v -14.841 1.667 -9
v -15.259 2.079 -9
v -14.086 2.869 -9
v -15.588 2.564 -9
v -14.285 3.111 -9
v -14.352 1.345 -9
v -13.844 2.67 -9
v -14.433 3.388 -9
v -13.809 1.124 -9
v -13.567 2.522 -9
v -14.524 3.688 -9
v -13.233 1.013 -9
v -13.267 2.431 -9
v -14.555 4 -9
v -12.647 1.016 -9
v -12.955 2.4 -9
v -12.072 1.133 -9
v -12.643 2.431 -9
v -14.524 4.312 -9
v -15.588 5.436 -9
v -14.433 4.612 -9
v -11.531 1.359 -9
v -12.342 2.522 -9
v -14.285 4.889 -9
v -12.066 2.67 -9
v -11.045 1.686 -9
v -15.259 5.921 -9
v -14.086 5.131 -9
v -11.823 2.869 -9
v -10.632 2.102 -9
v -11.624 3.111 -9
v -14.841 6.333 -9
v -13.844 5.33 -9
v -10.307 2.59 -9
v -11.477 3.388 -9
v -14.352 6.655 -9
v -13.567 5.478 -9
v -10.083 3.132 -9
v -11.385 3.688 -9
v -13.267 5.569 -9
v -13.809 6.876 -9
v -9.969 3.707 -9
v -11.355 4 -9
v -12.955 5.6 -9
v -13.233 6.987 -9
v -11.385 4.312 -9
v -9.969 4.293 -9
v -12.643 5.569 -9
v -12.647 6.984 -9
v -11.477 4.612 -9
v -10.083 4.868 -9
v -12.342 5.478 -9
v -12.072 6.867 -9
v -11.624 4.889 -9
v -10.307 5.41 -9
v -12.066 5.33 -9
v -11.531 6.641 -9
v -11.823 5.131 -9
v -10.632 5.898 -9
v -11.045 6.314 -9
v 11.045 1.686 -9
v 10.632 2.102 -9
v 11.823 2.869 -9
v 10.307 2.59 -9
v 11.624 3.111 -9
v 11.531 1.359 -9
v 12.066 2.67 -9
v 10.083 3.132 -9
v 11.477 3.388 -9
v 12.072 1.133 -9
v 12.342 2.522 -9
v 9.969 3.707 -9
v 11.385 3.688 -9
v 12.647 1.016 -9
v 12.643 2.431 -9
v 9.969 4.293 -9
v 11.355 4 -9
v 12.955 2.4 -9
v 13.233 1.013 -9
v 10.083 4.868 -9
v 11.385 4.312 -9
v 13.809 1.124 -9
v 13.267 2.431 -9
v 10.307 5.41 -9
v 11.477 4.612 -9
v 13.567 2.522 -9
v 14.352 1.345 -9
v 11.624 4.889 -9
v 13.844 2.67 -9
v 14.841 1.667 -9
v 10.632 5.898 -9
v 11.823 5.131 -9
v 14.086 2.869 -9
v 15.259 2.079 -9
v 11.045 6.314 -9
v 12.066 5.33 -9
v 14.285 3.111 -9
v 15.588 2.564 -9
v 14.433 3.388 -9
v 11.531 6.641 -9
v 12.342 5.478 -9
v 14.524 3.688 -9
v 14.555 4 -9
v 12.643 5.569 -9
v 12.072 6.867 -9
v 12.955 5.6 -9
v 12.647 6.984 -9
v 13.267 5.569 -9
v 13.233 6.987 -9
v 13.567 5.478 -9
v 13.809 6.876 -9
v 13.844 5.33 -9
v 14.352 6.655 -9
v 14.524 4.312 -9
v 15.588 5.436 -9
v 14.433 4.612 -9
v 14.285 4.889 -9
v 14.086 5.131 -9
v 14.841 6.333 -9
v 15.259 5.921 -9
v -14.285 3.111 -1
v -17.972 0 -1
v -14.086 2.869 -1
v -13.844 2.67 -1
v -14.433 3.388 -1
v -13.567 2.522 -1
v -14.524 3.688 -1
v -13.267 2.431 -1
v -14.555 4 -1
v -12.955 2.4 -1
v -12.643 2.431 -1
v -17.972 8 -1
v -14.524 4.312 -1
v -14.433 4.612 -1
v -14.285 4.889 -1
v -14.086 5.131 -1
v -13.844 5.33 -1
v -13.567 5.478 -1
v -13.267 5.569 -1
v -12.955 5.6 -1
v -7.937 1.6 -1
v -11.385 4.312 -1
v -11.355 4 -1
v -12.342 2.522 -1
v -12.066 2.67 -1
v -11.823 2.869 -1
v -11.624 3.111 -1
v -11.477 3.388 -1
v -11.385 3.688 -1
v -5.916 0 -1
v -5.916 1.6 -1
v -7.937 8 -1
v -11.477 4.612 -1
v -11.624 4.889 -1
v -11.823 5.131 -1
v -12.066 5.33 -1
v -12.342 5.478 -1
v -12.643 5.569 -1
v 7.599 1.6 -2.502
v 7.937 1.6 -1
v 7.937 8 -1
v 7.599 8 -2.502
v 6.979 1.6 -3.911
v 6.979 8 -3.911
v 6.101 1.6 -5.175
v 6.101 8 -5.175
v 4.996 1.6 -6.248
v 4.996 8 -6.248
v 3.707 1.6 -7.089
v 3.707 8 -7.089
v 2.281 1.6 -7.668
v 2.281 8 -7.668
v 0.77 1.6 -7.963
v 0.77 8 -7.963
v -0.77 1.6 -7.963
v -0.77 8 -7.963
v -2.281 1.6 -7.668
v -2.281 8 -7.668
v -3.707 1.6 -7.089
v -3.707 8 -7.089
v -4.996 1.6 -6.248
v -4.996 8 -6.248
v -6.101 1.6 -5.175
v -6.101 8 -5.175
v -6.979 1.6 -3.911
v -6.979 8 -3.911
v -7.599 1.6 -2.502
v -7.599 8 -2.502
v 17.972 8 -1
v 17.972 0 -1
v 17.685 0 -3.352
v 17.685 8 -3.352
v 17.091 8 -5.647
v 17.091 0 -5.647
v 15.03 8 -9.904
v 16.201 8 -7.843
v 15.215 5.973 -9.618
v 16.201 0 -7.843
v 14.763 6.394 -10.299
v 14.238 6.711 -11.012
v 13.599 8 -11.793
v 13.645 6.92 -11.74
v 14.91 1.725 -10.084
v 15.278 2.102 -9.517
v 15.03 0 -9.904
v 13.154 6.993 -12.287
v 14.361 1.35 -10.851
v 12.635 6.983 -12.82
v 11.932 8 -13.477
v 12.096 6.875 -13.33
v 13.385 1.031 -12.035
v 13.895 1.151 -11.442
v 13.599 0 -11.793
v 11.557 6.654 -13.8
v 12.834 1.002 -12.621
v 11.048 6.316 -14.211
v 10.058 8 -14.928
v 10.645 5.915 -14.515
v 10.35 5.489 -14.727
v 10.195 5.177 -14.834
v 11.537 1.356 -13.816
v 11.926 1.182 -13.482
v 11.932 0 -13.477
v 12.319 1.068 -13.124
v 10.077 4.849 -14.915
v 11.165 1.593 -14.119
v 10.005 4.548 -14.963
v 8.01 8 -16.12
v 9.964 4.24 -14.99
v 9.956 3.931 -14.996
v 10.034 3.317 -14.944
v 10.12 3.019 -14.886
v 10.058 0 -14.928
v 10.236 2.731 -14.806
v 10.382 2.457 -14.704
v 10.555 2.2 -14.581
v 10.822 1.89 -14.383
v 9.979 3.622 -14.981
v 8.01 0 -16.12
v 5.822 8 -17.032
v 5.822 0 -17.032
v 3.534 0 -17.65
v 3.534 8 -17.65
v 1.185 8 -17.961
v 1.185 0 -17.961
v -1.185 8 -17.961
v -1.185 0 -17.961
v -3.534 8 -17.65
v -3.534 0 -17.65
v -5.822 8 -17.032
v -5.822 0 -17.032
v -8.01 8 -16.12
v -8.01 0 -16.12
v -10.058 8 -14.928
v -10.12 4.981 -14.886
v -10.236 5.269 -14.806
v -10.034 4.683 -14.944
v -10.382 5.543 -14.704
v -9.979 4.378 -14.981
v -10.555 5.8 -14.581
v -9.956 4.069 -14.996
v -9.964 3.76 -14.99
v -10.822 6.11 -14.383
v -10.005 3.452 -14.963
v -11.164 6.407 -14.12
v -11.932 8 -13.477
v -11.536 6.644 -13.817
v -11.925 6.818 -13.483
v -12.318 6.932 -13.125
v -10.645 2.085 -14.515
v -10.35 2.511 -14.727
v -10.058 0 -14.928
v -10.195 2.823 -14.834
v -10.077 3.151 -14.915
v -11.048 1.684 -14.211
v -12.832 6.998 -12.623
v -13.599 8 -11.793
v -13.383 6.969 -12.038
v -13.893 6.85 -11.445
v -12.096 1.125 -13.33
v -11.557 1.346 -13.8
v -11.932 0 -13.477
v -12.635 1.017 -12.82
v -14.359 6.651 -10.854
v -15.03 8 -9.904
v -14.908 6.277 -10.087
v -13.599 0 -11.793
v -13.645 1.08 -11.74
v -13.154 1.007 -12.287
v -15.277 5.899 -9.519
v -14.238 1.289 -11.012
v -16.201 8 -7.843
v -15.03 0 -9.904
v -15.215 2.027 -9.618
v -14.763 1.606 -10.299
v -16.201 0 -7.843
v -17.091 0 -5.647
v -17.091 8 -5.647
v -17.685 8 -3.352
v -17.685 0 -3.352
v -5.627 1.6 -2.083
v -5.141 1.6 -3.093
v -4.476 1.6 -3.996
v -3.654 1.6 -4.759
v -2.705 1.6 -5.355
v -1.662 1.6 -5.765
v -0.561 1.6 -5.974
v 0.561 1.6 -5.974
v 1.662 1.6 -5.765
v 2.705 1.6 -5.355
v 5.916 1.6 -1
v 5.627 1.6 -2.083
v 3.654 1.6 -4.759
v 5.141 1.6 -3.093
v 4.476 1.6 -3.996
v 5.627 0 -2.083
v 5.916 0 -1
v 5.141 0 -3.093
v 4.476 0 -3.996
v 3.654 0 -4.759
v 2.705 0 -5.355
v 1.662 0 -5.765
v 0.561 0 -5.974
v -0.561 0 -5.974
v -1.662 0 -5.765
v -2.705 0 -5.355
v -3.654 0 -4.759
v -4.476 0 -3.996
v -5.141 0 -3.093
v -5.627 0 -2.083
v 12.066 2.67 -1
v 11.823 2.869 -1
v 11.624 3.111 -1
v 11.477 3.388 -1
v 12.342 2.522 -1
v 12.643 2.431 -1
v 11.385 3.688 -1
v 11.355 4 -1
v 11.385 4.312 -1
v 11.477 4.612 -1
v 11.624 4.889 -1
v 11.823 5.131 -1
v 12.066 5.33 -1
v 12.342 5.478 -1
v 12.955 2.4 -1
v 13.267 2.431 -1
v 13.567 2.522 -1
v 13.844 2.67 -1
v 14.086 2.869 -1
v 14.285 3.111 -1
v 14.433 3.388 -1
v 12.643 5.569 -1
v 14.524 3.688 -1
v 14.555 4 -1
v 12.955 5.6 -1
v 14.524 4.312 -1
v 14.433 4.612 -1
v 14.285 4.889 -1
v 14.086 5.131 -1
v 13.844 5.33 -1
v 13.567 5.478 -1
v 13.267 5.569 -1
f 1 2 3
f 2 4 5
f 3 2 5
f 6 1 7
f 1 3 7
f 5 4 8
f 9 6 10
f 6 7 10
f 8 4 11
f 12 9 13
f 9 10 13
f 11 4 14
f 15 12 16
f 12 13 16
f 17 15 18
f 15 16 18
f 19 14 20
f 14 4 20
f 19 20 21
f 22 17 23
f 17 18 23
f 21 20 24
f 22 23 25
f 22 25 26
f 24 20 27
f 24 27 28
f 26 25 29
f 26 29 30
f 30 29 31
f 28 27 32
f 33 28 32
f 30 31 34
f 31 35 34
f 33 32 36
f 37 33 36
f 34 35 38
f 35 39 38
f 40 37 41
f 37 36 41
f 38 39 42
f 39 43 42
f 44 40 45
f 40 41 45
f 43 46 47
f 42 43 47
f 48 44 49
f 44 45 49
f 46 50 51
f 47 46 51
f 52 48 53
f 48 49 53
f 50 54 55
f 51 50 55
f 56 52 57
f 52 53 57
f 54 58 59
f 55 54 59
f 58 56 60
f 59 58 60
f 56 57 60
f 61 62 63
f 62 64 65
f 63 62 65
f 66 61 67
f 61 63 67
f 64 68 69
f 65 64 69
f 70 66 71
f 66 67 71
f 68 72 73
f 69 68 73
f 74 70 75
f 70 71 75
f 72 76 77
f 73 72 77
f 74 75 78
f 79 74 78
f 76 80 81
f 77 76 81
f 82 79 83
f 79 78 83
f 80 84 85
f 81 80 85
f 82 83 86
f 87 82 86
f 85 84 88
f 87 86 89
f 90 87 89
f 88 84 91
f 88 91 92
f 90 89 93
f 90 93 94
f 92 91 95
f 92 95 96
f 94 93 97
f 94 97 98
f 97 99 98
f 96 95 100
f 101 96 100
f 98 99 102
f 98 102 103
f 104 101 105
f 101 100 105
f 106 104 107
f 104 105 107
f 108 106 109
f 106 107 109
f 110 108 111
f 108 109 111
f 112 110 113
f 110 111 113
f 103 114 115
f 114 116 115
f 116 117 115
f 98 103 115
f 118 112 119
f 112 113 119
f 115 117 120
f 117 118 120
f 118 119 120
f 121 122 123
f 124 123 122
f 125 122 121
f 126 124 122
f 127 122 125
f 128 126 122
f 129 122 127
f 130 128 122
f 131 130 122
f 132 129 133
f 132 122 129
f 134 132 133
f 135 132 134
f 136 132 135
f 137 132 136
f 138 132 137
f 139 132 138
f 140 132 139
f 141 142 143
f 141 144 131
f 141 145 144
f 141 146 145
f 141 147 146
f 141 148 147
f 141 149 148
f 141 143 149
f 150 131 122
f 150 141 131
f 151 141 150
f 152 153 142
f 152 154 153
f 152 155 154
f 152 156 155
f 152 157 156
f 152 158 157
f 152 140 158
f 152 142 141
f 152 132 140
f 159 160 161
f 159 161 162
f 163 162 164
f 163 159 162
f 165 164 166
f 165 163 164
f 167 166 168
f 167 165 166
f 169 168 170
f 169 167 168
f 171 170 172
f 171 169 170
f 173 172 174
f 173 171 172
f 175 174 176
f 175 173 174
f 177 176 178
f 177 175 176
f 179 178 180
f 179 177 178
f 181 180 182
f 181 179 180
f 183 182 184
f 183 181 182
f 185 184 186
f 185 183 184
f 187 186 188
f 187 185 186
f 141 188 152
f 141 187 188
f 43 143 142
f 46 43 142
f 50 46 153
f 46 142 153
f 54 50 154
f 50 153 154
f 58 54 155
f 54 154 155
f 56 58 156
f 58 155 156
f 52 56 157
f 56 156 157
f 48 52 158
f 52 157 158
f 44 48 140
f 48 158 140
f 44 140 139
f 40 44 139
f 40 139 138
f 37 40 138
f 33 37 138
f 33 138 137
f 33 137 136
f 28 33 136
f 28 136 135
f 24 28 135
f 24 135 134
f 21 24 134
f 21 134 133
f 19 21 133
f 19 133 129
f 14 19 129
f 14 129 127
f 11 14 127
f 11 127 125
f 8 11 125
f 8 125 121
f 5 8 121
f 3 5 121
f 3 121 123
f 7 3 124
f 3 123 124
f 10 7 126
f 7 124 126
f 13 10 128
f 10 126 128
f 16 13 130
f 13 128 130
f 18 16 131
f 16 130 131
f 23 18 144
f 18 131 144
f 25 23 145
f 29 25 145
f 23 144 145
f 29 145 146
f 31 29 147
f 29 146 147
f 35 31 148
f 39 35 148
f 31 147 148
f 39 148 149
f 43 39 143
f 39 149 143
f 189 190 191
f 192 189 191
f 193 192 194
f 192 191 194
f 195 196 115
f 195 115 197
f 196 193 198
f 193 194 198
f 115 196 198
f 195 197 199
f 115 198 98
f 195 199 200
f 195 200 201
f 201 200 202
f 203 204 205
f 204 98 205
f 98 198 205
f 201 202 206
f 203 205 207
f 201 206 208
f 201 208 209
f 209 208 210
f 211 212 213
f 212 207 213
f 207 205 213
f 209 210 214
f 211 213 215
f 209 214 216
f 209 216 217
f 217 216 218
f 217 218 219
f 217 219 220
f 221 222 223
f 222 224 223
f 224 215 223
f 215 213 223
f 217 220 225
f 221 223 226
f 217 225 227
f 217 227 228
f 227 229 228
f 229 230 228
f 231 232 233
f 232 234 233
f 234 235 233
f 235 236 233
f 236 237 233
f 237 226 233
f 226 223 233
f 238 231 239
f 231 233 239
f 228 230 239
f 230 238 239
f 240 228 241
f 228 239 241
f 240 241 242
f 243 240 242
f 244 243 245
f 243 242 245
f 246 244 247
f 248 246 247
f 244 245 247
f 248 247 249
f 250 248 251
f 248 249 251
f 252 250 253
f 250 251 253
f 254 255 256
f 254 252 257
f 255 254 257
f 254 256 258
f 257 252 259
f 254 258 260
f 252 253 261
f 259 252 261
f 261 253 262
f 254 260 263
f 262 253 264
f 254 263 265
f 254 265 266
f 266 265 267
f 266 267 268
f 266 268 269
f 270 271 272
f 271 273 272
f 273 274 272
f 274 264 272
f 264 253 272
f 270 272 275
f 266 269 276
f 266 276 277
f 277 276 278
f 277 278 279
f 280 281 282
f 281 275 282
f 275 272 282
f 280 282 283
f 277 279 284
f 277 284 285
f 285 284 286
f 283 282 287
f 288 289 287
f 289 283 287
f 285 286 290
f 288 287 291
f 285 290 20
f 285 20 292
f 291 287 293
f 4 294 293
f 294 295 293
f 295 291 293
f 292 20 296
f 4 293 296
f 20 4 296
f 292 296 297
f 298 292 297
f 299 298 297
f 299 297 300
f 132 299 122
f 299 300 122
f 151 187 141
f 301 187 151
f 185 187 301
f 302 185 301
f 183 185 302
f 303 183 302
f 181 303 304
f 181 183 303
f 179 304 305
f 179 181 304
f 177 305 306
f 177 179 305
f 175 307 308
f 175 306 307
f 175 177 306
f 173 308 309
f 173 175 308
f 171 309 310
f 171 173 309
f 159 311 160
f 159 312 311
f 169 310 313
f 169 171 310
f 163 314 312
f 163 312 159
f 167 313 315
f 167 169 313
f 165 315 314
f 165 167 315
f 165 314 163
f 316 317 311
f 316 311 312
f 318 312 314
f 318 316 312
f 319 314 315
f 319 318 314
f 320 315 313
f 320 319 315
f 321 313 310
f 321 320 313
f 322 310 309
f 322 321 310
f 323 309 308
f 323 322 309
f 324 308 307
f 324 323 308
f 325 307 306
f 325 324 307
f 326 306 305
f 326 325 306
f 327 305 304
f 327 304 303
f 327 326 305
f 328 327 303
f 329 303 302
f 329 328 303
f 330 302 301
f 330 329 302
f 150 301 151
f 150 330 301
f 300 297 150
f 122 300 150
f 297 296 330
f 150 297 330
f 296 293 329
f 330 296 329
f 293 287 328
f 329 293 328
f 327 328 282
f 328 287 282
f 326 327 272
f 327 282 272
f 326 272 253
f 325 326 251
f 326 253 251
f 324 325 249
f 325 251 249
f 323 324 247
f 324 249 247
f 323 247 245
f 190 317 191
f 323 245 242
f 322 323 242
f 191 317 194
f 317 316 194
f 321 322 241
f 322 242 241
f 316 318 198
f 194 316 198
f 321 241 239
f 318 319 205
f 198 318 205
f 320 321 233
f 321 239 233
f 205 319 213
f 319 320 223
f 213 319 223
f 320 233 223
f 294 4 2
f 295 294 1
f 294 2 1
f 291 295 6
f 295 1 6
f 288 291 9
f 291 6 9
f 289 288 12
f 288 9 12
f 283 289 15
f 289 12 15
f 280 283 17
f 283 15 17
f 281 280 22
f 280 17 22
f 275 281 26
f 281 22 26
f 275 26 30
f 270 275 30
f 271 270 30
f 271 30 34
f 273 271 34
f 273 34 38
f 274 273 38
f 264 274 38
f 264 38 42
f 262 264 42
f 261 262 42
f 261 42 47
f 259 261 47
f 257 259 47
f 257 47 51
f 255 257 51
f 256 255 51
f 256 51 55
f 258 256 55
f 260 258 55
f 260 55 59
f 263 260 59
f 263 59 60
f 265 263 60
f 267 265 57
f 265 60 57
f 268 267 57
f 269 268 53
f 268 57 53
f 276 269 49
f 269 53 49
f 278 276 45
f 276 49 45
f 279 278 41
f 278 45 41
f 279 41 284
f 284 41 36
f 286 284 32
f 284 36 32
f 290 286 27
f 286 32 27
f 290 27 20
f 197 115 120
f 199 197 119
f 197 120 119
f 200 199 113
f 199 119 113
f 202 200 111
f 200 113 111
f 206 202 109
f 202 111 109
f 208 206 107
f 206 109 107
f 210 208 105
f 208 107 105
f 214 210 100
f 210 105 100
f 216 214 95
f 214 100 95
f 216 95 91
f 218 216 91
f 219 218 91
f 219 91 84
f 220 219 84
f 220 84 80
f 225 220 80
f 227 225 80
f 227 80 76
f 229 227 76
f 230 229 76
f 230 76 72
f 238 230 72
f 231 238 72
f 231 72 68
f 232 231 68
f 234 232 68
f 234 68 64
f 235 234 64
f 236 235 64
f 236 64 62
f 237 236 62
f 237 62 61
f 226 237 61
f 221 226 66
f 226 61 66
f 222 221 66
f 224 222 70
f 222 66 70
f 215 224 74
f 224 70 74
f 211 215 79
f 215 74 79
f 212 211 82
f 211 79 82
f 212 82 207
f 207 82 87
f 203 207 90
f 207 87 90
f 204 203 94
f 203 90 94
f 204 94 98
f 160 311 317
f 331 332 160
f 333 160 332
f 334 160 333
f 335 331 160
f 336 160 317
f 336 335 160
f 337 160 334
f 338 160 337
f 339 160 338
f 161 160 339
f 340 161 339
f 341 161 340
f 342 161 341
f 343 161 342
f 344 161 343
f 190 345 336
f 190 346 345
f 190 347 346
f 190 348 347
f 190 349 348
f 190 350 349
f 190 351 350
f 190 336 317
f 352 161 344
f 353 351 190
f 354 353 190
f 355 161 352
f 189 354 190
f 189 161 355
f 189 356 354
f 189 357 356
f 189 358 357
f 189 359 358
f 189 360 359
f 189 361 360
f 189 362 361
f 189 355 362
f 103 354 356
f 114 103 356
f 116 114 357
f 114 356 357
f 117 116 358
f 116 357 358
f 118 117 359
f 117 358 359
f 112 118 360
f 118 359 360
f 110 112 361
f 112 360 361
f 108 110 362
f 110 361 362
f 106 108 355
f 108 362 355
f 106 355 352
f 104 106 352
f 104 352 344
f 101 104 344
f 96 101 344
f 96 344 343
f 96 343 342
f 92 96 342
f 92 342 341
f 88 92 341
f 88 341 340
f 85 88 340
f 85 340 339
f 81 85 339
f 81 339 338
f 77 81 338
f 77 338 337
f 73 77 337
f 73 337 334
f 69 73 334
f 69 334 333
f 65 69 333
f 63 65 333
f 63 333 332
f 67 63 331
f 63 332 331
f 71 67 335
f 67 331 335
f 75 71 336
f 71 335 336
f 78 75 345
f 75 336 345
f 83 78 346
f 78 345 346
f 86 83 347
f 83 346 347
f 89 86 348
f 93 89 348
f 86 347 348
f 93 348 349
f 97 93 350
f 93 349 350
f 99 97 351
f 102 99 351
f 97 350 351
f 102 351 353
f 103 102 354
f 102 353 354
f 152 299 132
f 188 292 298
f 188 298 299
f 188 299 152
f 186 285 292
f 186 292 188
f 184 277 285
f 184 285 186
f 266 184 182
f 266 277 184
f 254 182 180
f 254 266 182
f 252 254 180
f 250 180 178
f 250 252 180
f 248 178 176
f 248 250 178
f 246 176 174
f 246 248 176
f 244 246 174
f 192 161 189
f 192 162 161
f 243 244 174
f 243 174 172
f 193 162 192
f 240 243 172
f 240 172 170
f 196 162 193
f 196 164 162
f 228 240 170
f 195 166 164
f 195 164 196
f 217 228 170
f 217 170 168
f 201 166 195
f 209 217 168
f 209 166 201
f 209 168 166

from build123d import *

# Parameters (mm, degrees)
SKETCH1_R           = 18
SKETCH1_R_2         = 8
BOSS_EXTRUDE1_DEPTH = 8
SKETCH2_R           = 8
SKETCH2_R_2         = 6
BOSS_EXTRUDE2_DEPTH = 1.6
SKETCH3_W           = 40
SKETCH3_H           = 20
CUT_EXTRUDE1_DEPTH  = 9
CUT_EXTRUDE2_REACH  = 19
SKETCH5_R           = 1.6
CUT_EXTRUDE3_REACH  = 27
CUT_EXTRUDE3_START  = -8
SKETCH6_R           = 3


with BuildPart() as part:
    # Sketch1 → Boss-Extrude1 (new body)
    with BuildSketch(Plane(origin=(0, 0, 0), x_dir=(1, 0, 0), z_dir=(0, 1, 0))):
        Circle(SKETCH1_R)
        Circle(SKETCH1_R_2, mode=Mode.SUBTRACT)
    extrude(amount=BOSS_EXTRUDE1_DEPTH)

    # Sketch2 → Boss-Extrude2 (add)
    with BuildSketch(Plane(origin=(0, 0, 0), x_dir=(1, 0, 0), z_dir=(0, 1, 0))):
        Circle(SKETCH2_R)
        Circle(SKETCH2_R_2, mode=Mode.SUBTRACT)
    extrude(amount=BOSS_EXTRUDE2_DEPTH)

    # Sketch3 → Cut-Extrude1 (cut, through all)
    with BuildSketch(Plane(origin=(0, 8, 0), x_dir=(1, 0, 0), z_dir=(0, 1, 0))):
        with Locations((0, -9)):
            Rectangle(SKETCH3_W, SKETCH3_H)
    extrude(amount=-CUT_EXTRUDE1_DEPTH, mode=Mode.SUBTRACT)

    # Sketch5 → Cut-Extrude2 (cut, up to next)
    with BuildSketch(Plane.XY.offset(-1), mode=Mode.PRIVATE) as cut_extrude2_sk1:
        with Locations((-12.954727344, 4)):
            Circle(SKETCH5_R)
    cut_extrude2_tool1 = extrude(cut_extrude2_sk1.sketch, amount=-CUT_EXTRUDE2_REACH, mode=Mode.PRIVATE) & part.part
    add(cut_extrude2_tool1.solids().sort_by_distance((-12.954727, 4, -1))[0], mode=Mode.SUBTRACT)
    # Sketch5 → Cut-Extrude2 (cut, up to next)
    with BuildSketch(Plane.XY.offset(-1), mode=Mode.PRIVATE) as cut_extrude2_sk2:
        with Locations((12.954727344, 4)):
            Circle(SKETCH5_R)
    cut_extrude2_tool2 = extrude(cut_extrude2_sk2.sketch, amount=-CUT_EXTRUDE2_REACH, mode=Mode.PRIVATE) & part.part
    add(cut_extrude2_tool2.solids().sort_by_distance((12.954727, 4, -1))[0], mode=Mode.SUBTRACT)

    # Sketch6 → Cut-Extrude3 (cut, up to next)
    with BuildSketch(Plane.XY.offset(-1).offset(CUT_EXTRUDE3_START), mode=Mode.PRIVATE) as cut_extrude3_sk1:
        with Locations((-12.954727344, 4)):
            Circle(SKETCH6_R)
    cut_extrude3_tool1 = extrude(cut_extrude3_sk1.sketch, amount=-CUT_EXTRUDE3_REACH, mode=Mode.PRIVATE) & part.part
    add(cut_extrude3_tool1.solids().sort_by_distance((-12.954727, 4, -9))[0], mode=Mode.SUBTRACT)
    # Sketch6 → Cut-Extrude3 (cut, up to next)
    with BuildSketch(Plane.XY.offset(-1).offset(CUT_EXTRUDE3_START), mode=Mode.PRIVATE) as cut_extrude3_sk2:
        with Locations((12.954727344, 4)):
            Circle(SKETCH6_R)
    cut_extrude3_tool2 = extrude(cut_extrude3_sk2.sketch, amount=-CUT_EXTRUDE3_REACH, mode=Mode.PRIVATE) & part.part
    add(cut_extrude3_tool2.solids().sort_by_distance((12.954727, 4, -9))[0], mode=Mode.SUBTRACT)


solid = part.part
